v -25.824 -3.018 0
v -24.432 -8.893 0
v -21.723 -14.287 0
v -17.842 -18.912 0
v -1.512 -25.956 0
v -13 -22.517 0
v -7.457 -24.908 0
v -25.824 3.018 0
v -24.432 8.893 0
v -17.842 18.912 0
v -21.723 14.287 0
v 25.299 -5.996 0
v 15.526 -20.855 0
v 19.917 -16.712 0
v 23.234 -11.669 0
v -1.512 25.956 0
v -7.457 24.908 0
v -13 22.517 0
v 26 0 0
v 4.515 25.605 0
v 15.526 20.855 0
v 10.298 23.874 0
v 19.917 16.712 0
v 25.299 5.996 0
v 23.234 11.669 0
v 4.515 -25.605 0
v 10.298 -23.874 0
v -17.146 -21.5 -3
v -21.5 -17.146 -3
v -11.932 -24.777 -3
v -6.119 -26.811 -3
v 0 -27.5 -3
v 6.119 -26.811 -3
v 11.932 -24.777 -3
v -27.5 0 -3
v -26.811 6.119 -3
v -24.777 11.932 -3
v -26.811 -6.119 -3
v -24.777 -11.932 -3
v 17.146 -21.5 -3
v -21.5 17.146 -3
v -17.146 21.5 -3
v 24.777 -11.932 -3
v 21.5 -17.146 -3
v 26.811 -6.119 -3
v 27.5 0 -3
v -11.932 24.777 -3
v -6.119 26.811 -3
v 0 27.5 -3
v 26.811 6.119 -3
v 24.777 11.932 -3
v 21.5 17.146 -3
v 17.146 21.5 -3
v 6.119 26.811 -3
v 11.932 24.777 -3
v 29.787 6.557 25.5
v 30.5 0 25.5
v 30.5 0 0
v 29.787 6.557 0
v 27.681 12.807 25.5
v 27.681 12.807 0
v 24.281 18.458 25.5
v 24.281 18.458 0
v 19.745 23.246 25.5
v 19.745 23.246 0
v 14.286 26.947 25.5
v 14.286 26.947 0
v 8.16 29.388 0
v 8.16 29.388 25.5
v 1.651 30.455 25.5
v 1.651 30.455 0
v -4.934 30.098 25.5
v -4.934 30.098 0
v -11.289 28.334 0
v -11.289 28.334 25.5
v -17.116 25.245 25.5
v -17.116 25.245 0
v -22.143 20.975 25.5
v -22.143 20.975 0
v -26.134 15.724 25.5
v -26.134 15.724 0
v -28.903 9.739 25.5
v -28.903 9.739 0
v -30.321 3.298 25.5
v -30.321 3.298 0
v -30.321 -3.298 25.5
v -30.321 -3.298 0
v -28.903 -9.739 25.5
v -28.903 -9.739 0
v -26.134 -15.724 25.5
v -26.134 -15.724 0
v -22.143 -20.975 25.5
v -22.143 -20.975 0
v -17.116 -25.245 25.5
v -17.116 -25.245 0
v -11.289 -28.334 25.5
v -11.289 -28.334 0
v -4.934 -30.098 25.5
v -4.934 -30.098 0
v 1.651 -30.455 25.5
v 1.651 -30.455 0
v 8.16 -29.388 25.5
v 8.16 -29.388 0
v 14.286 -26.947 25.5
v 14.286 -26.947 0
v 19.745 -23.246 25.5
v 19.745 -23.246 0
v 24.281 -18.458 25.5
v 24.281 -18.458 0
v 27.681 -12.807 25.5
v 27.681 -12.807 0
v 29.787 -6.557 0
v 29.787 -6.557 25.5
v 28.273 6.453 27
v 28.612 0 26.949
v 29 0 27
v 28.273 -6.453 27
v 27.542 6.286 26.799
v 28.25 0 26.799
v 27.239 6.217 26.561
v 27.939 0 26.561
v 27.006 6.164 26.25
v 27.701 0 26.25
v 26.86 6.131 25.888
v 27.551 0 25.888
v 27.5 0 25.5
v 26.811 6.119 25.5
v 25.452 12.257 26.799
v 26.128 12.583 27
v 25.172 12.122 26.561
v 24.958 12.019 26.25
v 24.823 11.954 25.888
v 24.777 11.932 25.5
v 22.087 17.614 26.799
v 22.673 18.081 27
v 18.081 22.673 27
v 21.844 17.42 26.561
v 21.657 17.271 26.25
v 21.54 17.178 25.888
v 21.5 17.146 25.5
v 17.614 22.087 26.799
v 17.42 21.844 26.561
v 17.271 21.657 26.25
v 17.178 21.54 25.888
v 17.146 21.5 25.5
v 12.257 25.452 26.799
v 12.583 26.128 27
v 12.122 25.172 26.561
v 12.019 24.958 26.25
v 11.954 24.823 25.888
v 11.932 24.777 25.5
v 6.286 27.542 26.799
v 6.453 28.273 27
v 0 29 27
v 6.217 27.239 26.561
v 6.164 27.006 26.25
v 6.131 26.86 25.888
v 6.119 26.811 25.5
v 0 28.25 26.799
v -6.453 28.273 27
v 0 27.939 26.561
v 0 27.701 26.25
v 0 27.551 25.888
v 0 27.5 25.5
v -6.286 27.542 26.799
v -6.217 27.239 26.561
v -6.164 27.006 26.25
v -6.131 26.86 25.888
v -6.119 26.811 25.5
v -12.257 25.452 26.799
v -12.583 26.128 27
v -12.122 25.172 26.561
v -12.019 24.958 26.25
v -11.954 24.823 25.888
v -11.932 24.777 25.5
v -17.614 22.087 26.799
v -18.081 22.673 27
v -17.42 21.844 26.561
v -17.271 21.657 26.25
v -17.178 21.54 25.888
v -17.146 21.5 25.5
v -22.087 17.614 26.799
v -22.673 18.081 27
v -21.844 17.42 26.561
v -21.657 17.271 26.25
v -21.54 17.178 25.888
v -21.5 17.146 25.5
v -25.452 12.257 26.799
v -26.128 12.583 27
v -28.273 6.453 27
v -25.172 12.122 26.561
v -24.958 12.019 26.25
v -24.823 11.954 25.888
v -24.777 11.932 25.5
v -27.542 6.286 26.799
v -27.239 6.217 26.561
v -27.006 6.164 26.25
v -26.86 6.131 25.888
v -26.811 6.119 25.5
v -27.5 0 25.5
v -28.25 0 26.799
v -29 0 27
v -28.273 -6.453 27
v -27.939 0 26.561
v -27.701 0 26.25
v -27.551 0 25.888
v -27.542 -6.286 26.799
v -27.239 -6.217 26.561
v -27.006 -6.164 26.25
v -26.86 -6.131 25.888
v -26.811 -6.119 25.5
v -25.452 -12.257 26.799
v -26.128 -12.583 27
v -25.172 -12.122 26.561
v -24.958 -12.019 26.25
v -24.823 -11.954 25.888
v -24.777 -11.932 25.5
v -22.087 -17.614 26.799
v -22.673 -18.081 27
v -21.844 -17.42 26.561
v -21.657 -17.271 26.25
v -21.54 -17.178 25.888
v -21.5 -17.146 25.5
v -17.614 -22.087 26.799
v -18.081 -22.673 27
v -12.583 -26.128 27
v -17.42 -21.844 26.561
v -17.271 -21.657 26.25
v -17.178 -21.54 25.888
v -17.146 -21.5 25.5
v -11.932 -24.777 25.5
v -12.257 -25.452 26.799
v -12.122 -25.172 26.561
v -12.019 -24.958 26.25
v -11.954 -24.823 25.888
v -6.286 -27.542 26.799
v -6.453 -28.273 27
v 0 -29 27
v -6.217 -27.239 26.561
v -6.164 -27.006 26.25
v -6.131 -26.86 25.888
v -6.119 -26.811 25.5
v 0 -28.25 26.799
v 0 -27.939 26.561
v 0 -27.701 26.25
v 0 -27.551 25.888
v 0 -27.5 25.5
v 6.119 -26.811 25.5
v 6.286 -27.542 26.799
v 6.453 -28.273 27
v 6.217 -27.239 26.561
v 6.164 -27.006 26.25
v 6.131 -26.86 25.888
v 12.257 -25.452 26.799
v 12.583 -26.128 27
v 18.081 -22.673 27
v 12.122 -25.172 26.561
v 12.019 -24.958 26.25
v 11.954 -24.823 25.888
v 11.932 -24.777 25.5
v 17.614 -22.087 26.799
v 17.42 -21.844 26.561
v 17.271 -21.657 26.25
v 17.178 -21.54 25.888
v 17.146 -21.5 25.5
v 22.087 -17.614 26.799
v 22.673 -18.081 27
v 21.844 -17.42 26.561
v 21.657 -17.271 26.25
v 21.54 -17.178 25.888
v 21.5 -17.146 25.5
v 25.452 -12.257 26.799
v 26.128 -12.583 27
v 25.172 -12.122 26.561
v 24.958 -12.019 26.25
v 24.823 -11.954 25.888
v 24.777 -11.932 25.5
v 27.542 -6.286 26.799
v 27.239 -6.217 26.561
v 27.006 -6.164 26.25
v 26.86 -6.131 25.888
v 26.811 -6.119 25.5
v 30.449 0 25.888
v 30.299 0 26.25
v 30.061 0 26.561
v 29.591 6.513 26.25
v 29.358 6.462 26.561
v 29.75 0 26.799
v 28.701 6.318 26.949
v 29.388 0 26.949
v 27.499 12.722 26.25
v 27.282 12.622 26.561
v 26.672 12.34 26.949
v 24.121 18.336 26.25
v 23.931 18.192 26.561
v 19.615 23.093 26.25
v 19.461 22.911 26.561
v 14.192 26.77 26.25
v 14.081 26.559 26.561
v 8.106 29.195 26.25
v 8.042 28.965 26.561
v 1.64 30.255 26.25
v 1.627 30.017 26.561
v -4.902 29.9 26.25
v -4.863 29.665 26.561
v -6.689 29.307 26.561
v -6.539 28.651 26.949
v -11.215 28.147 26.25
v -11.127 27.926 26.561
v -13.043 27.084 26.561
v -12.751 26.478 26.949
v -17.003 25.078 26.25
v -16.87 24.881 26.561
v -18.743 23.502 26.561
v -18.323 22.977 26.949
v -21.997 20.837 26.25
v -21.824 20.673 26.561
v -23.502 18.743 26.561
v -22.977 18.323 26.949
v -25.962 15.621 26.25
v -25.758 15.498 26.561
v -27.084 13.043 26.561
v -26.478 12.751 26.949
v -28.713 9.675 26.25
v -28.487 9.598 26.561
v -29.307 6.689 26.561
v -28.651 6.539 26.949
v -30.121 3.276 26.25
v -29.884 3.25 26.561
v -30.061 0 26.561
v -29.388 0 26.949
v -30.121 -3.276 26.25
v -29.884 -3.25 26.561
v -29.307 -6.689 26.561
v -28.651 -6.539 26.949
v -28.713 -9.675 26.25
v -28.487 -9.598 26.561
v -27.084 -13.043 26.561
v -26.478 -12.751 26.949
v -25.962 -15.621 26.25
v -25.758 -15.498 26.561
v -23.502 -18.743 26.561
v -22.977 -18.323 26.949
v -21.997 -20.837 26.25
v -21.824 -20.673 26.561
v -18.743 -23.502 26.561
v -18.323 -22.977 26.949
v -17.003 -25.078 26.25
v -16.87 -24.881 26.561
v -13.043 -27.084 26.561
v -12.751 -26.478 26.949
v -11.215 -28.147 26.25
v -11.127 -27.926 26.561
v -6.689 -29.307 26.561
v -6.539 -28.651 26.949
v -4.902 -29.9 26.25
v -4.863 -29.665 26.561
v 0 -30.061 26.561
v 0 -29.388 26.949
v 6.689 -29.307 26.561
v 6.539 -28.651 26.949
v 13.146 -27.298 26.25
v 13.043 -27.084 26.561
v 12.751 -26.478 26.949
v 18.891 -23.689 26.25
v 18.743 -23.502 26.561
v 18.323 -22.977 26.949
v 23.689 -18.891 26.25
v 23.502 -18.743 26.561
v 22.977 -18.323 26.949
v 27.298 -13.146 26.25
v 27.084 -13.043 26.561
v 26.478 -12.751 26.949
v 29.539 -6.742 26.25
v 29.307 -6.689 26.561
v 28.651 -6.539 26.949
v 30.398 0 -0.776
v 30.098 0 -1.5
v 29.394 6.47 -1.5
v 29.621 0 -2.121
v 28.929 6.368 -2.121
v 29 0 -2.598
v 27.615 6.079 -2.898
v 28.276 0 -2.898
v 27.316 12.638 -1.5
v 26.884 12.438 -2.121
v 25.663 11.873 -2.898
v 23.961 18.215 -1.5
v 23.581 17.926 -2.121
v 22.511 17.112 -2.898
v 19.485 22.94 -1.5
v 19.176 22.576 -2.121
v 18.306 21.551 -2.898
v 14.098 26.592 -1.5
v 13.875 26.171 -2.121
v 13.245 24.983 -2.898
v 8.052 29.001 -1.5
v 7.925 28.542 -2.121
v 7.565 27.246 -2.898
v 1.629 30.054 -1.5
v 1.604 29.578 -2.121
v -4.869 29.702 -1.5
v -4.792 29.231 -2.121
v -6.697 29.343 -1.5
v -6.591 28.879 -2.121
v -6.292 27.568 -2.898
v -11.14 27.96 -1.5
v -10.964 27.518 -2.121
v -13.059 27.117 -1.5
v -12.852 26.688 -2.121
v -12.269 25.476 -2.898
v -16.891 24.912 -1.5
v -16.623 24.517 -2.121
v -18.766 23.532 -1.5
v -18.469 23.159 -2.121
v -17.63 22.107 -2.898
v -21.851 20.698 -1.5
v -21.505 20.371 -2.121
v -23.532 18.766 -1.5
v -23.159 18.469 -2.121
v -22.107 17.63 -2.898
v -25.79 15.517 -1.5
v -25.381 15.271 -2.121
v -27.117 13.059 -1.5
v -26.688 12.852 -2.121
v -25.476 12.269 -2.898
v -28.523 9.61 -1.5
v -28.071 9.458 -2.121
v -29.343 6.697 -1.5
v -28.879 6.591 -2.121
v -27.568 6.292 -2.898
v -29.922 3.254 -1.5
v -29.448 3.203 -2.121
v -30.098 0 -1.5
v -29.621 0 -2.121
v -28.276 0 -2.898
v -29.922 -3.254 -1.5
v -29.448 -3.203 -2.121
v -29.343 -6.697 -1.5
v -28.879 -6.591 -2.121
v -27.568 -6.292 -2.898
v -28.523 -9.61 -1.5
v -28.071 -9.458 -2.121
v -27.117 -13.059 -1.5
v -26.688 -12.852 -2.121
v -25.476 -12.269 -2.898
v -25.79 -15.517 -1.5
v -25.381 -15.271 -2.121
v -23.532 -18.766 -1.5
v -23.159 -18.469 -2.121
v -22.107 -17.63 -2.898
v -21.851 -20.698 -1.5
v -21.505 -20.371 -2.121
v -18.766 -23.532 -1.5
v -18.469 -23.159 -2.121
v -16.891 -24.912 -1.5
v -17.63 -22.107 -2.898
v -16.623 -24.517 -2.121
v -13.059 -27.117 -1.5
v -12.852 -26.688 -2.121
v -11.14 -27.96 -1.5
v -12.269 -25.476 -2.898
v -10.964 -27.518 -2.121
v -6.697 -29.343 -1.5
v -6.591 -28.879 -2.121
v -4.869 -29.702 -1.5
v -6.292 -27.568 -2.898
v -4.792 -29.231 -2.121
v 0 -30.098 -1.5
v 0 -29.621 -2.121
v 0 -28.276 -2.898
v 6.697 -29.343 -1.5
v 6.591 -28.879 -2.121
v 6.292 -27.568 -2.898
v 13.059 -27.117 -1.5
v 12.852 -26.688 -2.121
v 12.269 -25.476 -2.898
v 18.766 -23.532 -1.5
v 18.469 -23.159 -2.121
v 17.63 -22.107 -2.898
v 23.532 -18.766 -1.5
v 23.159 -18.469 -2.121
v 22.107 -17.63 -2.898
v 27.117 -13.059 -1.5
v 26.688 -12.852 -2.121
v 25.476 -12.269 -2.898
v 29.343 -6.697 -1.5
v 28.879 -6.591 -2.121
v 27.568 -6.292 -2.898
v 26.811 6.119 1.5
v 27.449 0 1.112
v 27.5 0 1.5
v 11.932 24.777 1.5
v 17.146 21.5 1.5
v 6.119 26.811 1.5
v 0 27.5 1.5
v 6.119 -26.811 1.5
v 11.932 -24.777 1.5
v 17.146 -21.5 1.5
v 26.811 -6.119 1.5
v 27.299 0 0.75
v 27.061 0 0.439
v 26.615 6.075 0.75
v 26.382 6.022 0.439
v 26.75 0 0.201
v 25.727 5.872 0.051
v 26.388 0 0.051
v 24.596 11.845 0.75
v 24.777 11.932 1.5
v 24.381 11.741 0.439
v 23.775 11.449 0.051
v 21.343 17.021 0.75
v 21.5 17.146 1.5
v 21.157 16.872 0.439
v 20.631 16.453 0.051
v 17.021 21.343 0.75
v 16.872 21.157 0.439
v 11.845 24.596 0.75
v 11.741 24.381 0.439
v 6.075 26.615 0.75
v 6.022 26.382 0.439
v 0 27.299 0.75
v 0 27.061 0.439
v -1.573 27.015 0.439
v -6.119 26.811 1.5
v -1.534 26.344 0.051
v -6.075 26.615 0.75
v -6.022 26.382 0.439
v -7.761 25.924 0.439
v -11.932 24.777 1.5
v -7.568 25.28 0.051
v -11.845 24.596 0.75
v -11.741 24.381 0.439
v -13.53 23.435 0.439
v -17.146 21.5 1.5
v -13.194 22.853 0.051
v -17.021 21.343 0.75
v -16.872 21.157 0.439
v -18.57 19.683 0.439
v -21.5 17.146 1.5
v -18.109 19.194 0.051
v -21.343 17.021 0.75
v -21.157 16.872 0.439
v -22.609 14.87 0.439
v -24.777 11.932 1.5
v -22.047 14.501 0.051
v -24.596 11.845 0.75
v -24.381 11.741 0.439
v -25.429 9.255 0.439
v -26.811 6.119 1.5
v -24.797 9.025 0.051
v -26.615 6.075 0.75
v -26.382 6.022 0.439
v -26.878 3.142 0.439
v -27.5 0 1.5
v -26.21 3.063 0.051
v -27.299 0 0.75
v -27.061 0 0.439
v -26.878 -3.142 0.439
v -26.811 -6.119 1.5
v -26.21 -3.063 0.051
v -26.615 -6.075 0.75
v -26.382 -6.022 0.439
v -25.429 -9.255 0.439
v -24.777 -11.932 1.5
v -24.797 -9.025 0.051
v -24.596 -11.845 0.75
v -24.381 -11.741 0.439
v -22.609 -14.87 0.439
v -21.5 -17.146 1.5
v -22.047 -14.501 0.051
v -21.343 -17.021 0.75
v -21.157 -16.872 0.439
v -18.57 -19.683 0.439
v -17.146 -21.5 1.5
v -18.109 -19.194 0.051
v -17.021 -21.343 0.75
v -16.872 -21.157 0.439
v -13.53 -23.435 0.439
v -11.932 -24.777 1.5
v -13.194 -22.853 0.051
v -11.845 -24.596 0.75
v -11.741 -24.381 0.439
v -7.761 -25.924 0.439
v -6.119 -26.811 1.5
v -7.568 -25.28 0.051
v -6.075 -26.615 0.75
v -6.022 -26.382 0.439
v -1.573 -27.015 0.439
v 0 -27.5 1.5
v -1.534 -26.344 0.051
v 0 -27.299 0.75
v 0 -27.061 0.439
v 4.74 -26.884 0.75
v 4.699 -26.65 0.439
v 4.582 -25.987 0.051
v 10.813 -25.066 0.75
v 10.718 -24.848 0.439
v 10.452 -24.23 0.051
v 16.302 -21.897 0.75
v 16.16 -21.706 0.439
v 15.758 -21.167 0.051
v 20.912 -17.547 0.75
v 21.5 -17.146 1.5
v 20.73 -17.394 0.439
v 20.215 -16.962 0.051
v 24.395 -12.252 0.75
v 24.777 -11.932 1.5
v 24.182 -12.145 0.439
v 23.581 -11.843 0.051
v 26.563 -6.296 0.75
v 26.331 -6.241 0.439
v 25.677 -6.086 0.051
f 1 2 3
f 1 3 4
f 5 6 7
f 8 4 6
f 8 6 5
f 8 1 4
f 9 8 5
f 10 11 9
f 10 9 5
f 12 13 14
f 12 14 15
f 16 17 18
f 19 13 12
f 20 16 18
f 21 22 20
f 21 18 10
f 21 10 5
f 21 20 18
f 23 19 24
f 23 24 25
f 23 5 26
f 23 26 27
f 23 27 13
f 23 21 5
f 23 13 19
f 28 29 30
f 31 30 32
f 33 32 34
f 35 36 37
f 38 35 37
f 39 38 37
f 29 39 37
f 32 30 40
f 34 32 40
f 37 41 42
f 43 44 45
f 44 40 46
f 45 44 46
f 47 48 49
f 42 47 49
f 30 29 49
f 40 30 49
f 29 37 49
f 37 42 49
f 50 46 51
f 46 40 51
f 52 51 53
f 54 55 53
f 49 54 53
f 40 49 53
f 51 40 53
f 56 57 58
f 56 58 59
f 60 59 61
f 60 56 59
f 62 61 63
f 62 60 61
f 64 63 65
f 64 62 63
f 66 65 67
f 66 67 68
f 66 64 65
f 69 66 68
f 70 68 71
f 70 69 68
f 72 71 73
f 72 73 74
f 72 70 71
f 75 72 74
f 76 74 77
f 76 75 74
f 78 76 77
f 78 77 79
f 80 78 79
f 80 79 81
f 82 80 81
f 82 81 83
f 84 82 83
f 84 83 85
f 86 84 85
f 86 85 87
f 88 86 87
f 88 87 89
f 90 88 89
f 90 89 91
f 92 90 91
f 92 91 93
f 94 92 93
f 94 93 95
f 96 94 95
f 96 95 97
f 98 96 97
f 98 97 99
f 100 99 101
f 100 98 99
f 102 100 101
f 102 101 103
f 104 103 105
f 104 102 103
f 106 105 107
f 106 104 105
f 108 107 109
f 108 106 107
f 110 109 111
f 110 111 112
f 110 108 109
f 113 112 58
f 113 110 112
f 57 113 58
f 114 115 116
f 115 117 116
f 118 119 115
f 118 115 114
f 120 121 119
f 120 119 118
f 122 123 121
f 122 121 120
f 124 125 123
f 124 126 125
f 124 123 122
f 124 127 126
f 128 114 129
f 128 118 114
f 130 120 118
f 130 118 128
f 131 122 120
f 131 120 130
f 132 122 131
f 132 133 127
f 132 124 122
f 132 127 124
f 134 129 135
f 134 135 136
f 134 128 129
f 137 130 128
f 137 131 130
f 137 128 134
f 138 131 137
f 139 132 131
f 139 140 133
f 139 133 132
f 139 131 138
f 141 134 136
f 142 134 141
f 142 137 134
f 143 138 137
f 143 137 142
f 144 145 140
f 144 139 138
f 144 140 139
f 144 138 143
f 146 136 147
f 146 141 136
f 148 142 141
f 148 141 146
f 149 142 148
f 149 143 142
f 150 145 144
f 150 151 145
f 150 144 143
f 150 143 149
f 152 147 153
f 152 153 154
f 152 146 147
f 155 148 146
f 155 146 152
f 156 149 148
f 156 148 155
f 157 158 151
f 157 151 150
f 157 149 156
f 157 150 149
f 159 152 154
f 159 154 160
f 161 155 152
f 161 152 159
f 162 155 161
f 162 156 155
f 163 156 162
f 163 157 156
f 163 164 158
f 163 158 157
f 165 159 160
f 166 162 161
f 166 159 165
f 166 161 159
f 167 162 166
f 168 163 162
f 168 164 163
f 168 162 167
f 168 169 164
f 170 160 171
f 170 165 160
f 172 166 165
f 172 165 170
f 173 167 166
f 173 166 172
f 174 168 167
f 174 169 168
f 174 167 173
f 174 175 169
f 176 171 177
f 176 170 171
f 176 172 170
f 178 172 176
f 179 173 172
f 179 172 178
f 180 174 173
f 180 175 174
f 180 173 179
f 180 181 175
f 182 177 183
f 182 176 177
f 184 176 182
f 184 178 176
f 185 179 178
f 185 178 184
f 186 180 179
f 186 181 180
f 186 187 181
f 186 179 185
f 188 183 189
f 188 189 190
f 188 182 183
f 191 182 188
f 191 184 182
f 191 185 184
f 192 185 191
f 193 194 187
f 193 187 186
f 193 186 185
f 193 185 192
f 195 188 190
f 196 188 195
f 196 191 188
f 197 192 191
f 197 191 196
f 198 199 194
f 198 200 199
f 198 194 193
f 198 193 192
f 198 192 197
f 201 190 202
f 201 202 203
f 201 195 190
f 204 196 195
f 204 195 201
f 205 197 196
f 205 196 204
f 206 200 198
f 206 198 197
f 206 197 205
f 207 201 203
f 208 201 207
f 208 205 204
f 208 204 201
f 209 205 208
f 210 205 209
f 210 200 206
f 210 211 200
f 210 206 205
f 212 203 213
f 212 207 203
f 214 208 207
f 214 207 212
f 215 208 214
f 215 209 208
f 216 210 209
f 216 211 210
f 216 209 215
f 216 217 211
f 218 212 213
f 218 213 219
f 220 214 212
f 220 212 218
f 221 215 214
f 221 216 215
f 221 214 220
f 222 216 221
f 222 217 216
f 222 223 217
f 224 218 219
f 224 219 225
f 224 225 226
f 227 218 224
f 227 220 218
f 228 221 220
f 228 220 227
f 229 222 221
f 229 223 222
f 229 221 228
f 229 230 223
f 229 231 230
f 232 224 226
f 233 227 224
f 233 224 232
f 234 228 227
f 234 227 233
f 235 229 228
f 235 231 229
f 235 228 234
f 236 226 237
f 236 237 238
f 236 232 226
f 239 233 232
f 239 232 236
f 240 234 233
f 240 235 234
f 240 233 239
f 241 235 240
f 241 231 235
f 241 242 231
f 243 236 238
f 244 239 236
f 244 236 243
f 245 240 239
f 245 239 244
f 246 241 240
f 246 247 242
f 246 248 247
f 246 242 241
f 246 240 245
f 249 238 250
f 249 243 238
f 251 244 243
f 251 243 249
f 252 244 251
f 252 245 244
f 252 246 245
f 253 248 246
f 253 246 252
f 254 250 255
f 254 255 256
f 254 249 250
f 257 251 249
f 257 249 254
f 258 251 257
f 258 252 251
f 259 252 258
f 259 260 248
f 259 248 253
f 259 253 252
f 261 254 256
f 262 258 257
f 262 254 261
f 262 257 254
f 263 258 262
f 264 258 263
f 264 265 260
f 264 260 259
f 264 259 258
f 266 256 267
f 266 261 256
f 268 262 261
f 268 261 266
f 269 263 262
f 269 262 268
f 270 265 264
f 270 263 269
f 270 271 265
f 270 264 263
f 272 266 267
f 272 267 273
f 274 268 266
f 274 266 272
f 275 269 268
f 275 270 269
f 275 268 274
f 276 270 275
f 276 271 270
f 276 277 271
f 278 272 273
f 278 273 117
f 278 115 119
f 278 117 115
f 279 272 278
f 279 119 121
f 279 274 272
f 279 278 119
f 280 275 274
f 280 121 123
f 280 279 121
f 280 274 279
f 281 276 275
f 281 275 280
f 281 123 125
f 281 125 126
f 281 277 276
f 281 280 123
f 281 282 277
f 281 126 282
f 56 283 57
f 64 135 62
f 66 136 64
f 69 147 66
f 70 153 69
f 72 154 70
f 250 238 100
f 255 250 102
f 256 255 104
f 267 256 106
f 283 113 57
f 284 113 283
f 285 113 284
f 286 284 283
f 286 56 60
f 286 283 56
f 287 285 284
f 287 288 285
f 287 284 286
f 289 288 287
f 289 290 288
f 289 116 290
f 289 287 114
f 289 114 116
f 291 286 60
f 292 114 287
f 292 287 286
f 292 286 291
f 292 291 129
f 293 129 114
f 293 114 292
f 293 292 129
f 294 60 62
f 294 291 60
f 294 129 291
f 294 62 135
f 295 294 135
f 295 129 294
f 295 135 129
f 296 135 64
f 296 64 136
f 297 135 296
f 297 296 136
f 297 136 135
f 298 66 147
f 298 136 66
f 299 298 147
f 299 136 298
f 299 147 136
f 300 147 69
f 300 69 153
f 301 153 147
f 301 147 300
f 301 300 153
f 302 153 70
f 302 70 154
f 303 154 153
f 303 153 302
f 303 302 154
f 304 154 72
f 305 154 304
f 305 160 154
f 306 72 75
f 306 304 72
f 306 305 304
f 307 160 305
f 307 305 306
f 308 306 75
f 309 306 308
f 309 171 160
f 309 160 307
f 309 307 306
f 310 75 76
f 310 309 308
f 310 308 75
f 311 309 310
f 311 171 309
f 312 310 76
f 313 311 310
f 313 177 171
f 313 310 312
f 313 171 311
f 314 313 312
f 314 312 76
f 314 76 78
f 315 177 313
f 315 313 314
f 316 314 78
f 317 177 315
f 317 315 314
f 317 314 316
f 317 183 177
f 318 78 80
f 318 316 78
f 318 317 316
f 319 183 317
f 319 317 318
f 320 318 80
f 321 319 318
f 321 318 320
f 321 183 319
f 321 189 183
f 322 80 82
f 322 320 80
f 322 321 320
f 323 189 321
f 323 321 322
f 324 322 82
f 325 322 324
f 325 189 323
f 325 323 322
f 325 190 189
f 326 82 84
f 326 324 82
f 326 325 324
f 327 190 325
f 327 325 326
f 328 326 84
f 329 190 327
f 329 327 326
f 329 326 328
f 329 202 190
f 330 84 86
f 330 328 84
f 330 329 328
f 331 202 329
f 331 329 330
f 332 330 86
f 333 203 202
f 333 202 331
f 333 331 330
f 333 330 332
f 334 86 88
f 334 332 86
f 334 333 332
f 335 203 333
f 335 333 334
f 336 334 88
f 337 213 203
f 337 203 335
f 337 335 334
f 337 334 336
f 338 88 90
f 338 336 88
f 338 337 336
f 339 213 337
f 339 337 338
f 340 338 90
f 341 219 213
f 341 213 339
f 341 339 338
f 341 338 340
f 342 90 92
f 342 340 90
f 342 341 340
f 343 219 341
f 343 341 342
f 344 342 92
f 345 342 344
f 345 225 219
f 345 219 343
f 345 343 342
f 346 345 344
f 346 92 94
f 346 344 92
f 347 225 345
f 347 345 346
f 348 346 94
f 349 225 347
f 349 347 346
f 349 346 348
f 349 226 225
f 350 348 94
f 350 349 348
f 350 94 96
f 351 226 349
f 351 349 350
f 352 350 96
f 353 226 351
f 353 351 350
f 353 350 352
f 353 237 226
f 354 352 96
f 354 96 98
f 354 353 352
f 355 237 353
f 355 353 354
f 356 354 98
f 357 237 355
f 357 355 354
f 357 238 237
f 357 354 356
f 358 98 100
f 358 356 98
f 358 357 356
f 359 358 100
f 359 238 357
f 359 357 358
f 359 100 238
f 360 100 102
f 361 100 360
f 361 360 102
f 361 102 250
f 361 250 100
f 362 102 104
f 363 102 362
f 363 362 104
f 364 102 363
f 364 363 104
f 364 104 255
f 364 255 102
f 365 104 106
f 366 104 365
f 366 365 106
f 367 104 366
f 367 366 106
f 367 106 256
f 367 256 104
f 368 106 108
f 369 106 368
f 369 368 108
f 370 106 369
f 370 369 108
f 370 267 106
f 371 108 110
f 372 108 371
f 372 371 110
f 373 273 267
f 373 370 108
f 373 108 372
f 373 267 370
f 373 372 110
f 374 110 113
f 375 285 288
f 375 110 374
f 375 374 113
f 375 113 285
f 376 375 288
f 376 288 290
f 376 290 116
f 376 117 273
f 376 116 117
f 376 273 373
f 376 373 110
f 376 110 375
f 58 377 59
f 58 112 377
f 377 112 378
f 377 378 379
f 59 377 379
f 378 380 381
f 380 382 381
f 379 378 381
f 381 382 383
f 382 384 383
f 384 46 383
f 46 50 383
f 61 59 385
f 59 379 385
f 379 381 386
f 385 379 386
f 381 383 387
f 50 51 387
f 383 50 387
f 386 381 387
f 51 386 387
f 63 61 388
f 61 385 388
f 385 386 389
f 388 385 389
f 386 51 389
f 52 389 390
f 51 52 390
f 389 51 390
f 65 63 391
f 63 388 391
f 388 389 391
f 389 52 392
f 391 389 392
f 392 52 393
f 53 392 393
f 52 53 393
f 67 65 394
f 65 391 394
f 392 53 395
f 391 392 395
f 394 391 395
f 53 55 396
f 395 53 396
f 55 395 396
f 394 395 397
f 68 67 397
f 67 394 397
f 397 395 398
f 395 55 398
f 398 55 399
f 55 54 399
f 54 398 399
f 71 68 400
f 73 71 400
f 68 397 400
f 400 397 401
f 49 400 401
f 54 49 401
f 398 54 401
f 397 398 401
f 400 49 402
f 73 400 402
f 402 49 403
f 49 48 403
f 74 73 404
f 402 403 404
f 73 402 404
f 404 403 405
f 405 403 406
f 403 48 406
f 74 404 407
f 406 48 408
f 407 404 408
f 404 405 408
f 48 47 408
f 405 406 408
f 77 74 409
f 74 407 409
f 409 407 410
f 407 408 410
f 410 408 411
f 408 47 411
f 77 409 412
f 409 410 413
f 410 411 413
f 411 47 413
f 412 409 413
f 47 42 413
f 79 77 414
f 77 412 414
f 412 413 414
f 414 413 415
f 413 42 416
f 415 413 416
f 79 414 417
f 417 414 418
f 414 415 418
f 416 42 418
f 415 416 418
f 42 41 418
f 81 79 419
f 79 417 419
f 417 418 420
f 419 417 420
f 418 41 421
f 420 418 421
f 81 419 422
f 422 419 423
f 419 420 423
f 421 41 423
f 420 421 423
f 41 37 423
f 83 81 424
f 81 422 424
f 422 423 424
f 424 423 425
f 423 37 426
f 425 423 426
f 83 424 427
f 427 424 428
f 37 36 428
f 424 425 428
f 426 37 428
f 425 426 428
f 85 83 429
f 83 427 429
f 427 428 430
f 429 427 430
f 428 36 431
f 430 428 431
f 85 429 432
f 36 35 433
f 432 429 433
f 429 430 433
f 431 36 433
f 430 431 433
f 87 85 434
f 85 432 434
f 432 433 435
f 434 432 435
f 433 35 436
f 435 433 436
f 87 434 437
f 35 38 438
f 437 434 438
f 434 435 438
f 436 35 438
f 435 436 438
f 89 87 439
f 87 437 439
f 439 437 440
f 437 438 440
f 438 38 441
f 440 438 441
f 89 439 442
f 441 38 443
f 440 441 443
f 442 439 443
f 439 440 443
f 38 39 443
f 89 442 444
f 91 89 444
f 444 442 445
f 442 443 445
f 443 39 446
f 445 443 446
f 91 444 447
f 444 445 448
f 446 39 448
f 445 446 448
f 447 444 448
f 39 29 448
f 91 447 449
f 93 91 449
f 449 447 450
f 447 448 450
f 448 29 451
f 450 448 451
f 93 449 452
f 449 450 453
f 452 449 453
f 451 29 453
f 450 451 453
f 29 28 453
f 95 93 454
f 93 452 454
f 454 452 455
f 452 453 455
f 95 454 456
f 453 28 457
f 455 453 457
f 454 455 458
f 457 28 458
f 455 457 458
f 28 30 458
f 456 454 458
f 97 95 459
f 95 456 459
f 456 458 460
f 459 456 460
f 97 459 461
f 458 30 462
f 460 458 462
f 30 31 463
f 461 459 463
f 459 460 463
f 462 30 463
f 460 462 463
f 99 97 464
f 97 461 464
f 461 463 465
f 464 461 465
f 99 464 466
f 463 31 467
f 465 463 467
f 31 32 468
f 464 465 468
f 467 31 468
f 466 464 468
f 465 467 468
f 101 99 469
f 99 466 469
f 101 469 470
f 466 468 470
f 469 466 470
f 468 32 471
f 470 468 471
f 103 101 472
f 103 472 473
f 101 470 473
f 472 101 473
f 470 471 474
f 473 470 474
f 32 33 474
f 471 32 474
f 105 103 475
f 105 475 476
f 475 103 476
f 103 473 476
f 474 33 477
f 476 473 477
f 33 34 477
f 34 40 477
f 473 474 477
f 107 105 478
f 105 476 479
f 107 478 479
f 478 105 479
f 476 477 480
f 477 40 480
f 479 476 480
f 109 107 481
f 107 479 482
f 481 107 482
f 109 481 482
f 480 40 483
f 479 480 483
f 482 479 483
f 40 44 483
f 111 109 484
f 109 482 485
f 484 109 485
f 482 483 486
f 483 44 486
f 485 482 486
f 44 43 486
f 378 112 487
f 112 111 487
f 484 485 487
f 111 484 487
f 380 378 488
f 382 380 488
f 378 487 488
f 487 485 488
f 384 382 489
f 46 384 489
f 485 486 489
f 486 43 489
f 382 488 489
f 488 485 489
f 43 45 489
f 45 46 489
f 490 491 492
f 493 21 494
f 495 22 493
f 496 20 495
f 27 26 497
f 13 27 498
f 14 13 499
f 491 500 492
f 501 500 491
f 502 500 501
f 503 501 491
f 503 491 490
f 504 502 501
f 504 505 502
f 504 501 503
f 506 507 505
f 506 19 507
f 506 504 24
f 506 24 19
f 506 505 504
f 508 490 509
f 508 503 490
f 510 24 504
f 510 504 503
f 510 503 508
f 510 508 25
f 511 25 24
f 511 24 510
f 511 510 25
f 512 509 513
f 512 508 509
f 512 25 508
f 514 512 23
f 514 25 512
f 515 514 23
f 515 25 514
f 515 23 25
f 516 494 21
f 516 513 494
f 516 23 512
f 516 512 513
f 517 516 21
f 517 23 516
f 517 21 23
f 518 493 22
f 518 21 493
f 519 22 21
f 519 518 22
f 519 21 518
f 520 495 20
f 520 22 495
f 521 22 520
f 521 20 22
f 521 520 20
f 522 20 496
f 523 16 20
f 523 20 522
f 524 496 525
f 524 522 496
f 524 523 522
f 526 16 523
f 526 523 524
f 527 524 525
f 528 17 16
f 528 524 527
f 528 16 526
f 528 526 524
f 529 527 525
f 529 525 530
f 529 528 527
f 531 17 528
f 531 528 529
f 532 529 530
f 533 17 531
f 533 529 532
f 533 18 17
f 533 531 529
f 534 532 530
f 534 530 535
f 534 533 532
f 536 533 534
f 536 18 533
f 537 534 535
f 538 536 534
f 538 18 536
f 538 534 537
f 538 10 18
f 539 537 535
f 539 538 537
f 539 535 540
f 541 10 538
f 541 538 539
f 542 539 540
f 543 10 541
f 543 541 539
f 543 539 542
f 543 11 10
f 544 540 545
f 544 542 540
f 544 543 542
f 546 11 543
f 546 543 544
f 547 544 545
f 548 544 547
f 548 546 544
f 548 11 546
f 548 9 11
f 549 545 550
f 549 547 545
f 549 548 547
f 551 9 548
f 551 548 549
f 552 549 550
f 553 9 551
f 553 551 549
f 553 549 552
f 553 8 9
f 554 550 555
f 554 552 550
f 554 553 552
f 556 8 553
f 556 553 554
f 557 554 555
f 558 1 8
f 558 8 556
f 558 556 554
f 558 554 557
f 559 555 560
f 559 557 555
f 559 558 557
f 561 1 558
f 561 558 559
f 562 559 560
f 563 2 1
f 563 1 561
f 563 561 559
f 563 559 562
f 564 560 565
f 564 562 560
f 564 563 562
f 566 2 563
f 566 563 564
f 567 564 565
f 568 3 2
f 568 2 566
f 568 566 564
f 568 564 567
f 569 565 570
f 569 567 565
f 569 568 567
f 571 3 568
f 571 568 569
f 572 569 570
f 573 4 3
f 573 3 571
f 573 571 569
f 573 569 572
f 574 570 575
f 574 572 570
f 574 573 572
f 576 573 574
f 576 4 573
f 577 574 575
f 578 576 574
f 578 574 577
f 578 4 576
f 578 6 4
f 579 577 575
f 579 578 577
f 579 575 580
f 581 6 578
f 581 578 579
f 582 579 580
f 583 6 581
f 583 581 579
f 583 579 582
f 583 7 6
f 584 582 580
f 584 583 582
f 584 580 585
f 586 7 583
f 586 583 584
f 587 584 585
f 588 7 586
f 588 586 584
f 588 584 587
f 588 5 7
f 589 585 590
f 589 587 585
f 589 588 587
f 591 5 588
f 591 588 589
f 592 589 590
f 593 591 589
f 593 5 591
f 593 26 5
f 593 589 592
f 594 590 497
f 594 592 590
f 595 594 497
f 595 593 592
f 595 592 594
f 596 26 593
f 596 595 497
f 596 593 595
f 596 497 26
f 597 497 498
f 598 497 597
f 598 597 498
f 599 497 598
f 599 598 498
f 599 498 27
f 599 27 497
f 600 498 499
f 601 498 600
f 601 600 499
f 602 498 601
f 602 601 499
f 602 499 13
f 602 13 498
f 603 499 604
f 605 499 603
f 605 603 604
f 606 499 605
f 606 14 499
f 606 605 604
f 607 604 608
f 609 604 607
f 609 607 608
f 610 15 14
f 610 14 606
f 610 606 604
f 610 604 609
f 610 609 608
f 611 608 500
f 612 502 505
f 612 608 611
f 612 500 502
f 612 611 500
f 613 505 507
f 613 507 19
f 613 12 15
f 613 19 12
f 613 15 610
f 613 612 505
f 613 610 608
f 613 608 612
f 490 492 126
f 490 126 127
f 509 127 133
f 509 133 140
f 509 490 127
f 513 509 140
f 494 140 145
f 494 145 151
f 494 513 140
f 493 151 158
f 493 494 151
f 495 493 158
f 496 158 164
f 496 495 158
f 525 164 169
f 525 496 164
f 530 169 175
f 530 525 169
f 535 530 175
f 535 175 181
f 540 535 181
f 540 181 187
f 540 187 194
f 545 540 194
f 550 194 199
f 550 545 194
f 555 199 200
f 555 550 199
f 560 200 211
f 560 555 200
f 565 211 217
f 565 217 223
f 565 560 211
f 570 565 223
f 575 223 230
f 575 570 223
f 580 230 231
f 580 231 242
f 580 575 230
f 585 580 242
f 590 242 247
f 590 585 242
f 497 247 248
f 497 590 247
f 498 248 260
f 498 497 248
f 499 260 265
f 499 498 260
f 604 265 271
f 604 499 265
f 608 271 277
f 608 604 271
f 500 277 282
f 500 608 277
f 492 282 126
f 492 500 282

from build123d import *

# Parameters (mm, degrees)
F0_R     = 30.5
F0_R_2   = 27.5
F1_DEPTH = 27
F2_DEPTH = 3
F3_R     = 1.49999
F4_R     = 2.99999


# Not quite as in the source:
# - a fillet or chamfer is up to 0.001 mm smaller than in the source, because OpenCascade refuses the exact size


with BuildPart() as f1:
    # F0 (on Top) → F1 (new body)
    with BuildSketch(Plane.XY):
        Circle(F0_R)
        Circle(F0_R_2, mode=Mode.SUBTRACT)
    extrude(amount=F1_DEPTH)

    # F0 (on Top) → F2 (join)
    with BuildSketch(Plane.XY):
        Circle(F0_R)
        Circle(F0_R_2, mode=Mode.SUBTRACT)
        Circle(F0_R_2)
    extrude(amount=-F2_DEPTH)

    # F3 (radius 1.5 in the source; OpenCascade refuses exactly that, so slightly less here)
    f3_edges = [f1.edges().sort_by_distance(p)[0] for p in [
        (-30.5, 0, 27),
        (-27.5, 0, 27),
        (-27.5, 0, 0),
    ]]
    fillet(f3_edges, radius=F3_R)

    # F4 (radius 3 in the source; OpenCascade refuses exactly that, so slightly less here)
    f4_edges = [f1.edges().sort_by_distance(p)[0] for p in [
        (-30.5, 0, -3),
    ]]
    fillet(f4_edges, radius=F4_R)


solid = f1.part
